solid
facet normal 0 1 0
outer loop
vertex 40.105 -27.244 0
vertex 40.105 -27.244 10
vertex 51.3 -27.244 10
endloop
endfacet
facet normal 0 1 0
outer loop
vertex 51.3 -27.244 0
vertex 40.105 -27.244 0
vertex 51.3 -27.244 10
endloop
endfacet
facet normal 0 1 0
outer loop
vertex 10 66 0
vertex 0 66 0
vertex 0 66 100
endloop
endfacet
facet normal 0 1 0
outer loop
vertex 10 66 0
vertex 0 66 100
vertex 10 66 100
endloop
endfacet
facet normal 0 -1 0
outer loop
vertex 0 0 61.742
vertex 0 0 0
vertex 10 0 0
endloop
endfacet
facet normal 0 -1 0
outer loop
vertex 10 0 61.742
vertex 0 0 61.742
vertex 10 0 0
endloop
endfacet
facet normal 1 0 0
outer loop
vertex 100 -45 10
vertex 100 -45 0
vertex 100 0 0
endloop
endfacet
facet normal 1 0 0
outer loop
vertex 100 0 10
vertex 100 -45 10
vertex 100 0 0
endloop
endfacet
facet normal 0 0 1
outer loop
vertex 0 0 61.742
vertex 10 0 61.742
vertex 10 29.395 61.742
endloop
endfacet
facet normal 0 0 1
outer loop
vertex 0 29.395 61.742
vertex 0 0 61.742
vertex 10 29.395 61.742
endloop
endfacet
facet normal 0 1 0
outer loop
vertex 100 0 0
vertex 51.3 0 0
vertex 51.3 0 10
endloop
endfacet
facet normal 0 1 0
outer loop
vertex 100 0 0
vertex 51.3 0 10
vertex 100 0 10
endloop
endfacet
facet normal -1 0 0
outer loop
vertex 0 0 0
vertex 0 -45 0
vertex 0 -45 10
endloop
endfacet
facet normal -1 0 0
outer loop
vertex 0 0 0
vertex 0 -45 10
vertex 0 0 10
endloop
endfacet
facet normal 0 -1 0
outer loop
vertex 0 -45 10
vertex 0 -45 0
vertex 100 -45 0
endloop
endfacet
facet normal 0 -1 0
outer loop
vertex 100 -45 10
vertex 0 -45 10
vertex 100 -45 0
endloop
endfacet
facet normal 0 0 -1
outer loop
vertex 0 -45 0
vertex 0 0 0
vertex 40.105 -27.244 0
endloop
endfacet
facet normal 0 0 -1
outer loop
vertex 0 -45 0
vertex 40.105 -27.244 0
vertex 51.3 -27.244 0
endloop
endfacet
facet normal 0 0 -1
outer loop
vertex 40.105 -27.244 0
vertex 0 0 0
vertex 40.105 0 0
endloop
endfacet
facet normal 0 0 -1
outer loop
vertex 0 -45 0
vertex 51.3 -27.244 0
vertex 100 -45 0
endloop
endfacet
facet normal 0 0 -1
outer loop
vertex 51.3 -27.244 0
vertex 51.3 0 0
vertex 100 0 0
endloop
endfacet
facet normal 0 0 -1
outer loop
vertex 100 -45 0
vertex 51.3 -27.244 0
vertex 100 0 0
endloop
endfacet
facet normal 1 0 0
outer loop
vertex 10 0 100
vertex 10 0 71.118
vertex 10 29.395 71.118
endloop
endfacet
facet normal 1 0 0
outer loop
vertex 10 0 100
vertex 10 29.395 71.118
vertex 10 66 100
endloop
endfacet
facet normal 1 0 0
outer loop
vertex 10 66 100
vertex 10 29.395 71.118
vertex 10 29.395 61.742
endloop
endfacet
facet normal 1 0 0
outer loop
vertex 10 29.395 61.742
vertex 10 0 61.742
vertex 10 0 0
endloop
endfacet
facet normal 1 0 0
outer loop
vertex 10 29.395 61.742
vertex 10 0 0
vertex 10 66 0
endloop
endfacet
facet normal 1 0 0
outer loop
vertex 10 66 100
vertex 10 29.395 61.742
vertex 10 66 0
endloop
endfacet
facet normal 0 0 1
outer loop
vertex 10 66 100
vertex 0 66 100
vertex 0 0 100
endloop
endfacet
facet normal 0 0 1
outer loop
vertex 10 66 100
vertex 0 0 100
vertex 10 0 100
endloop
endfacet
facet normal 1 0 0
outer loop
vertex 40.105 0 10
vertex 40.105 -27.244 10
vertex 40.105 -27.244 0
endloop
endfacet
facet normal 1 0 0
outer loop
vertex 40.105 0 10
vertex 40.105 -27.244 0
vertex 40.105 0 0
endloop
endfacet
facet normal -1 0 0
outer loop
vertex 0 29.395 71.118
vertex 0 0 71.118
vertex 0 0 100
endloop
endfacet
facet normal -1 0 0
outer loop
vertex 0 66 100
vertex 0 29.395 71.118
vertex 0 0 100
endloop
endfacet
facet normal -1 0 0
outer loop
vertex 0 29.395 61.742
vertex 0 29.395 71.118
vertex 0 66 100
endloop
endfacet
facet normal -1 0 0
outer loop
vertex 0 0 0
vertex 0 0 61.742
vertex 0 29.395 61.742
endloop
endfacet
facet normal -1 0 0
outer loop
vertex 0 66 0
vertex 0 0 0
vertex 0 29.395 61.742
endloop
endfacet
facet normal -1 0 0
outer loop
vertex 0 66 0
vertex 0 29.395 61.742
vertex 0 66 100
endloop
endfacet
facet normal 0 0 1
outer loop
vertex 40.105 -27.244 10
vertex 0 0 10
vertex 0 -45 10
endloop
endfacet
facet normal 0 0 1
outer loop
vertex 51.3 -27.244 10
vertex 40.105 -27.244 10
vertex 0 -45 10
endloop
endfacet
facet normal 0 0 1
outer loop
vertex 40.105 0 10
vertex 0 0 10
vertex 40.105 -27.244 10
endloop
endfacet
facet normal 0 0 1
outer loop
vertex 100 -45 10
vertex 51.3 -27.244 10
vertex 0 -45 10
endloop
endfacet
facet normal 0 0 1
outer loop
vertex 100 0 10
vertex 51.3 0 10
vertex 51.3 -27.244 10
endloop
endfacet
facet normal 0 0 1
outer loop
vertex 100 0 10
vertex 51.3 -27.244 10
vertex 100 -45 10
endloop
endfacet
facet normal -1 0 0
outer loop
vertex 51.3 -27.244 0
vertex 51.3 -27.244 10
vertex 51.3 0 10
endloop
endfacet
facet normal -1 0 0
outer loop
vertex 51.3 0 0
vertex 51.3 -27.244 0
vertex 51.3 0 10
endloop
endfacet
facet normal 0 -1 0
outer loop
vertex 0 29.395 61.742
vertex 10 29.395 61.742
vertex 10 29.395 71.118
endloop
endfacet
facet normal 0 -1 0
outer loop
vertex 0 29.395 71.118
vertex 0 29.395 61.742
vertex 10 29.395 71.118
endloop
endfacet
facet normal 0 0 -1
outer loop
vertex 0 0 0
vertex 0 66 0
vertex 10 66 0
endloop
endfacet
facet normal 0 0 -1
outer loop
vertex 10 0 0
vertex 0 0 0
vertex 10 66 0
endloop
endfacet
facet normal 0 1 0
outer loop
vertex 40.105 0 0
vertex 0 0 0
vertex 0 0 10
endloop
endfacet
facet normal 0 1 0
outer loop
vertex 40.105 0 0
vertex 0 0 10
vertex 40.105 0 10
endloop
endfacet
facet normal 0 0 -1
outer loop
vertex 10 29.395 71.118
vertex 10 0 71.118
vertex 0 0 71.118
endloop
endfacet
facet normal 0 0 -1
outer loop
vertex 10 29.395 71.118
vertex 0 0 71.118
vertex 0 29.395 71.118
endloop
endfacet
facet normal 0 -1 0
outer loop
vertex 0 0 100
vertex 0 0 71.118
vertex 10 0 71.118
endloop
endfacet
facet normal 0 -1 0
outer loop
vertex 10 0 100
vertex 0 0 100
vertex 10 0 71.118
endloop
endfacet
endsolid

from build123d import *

# Parameters (mm, degrees)
SKETCH_W        = 100
SKETCH_H        = 45
PAD_DEPTH       = 10
SKETCH001_W     = 11.195305
SKETCH001_H     = 27.540902
POCKET_DEPTH    = 10.001
BOX_W           = 10
BOX_H           = 66
BOX_DEPTH       = 100
SKETCH002_W     = 36.478956
SKETCH002_H     = 9.376126
POCKET001_DEPTH = 10.001


with BuildPart() as pocket:
    # Sketch → Pad (new body)
    with BuildSketch(Plane.XY):
        with Locations((50, -22.5)):
            Rectangle(SKETCH_W, SKETCH_H)
    extrude(amount=PAD_DEPTH)

    # Sketch001 → Pocket (cut, through all)
    with BuildSketch(Plane.XY.offset(10)):
        with Locations((45.70259, -13.473978)):
            Rectangle(SKETCH001_W, SKETCH001_H)
    extrude(amount=-POCKET_DEPTH, mode=Mode.SUBTRACT)


with BuildPart() as pocket001:
    # Box → Box (new body)
    with BuildSketch(Plane.XY):
        with Locations((5, 33)):
            Rectangle(BOX_W, BOX_H)
    extrude(amount=BOX_DEPTH)

    # Sketch002 → Pocket001 (cut, through all)
    with BuildSketch(Plane.YZ.offset(10)):
        with Locations((11.155181, 66.430399)):
            Rectangle(SKETCH002_W, SKETCH002_H)
    extrude(amount=-POCKET001_DEPTH, mode=Mode.SUBTRACT)


solid = Compound([pocket.part, pocket001.part])
